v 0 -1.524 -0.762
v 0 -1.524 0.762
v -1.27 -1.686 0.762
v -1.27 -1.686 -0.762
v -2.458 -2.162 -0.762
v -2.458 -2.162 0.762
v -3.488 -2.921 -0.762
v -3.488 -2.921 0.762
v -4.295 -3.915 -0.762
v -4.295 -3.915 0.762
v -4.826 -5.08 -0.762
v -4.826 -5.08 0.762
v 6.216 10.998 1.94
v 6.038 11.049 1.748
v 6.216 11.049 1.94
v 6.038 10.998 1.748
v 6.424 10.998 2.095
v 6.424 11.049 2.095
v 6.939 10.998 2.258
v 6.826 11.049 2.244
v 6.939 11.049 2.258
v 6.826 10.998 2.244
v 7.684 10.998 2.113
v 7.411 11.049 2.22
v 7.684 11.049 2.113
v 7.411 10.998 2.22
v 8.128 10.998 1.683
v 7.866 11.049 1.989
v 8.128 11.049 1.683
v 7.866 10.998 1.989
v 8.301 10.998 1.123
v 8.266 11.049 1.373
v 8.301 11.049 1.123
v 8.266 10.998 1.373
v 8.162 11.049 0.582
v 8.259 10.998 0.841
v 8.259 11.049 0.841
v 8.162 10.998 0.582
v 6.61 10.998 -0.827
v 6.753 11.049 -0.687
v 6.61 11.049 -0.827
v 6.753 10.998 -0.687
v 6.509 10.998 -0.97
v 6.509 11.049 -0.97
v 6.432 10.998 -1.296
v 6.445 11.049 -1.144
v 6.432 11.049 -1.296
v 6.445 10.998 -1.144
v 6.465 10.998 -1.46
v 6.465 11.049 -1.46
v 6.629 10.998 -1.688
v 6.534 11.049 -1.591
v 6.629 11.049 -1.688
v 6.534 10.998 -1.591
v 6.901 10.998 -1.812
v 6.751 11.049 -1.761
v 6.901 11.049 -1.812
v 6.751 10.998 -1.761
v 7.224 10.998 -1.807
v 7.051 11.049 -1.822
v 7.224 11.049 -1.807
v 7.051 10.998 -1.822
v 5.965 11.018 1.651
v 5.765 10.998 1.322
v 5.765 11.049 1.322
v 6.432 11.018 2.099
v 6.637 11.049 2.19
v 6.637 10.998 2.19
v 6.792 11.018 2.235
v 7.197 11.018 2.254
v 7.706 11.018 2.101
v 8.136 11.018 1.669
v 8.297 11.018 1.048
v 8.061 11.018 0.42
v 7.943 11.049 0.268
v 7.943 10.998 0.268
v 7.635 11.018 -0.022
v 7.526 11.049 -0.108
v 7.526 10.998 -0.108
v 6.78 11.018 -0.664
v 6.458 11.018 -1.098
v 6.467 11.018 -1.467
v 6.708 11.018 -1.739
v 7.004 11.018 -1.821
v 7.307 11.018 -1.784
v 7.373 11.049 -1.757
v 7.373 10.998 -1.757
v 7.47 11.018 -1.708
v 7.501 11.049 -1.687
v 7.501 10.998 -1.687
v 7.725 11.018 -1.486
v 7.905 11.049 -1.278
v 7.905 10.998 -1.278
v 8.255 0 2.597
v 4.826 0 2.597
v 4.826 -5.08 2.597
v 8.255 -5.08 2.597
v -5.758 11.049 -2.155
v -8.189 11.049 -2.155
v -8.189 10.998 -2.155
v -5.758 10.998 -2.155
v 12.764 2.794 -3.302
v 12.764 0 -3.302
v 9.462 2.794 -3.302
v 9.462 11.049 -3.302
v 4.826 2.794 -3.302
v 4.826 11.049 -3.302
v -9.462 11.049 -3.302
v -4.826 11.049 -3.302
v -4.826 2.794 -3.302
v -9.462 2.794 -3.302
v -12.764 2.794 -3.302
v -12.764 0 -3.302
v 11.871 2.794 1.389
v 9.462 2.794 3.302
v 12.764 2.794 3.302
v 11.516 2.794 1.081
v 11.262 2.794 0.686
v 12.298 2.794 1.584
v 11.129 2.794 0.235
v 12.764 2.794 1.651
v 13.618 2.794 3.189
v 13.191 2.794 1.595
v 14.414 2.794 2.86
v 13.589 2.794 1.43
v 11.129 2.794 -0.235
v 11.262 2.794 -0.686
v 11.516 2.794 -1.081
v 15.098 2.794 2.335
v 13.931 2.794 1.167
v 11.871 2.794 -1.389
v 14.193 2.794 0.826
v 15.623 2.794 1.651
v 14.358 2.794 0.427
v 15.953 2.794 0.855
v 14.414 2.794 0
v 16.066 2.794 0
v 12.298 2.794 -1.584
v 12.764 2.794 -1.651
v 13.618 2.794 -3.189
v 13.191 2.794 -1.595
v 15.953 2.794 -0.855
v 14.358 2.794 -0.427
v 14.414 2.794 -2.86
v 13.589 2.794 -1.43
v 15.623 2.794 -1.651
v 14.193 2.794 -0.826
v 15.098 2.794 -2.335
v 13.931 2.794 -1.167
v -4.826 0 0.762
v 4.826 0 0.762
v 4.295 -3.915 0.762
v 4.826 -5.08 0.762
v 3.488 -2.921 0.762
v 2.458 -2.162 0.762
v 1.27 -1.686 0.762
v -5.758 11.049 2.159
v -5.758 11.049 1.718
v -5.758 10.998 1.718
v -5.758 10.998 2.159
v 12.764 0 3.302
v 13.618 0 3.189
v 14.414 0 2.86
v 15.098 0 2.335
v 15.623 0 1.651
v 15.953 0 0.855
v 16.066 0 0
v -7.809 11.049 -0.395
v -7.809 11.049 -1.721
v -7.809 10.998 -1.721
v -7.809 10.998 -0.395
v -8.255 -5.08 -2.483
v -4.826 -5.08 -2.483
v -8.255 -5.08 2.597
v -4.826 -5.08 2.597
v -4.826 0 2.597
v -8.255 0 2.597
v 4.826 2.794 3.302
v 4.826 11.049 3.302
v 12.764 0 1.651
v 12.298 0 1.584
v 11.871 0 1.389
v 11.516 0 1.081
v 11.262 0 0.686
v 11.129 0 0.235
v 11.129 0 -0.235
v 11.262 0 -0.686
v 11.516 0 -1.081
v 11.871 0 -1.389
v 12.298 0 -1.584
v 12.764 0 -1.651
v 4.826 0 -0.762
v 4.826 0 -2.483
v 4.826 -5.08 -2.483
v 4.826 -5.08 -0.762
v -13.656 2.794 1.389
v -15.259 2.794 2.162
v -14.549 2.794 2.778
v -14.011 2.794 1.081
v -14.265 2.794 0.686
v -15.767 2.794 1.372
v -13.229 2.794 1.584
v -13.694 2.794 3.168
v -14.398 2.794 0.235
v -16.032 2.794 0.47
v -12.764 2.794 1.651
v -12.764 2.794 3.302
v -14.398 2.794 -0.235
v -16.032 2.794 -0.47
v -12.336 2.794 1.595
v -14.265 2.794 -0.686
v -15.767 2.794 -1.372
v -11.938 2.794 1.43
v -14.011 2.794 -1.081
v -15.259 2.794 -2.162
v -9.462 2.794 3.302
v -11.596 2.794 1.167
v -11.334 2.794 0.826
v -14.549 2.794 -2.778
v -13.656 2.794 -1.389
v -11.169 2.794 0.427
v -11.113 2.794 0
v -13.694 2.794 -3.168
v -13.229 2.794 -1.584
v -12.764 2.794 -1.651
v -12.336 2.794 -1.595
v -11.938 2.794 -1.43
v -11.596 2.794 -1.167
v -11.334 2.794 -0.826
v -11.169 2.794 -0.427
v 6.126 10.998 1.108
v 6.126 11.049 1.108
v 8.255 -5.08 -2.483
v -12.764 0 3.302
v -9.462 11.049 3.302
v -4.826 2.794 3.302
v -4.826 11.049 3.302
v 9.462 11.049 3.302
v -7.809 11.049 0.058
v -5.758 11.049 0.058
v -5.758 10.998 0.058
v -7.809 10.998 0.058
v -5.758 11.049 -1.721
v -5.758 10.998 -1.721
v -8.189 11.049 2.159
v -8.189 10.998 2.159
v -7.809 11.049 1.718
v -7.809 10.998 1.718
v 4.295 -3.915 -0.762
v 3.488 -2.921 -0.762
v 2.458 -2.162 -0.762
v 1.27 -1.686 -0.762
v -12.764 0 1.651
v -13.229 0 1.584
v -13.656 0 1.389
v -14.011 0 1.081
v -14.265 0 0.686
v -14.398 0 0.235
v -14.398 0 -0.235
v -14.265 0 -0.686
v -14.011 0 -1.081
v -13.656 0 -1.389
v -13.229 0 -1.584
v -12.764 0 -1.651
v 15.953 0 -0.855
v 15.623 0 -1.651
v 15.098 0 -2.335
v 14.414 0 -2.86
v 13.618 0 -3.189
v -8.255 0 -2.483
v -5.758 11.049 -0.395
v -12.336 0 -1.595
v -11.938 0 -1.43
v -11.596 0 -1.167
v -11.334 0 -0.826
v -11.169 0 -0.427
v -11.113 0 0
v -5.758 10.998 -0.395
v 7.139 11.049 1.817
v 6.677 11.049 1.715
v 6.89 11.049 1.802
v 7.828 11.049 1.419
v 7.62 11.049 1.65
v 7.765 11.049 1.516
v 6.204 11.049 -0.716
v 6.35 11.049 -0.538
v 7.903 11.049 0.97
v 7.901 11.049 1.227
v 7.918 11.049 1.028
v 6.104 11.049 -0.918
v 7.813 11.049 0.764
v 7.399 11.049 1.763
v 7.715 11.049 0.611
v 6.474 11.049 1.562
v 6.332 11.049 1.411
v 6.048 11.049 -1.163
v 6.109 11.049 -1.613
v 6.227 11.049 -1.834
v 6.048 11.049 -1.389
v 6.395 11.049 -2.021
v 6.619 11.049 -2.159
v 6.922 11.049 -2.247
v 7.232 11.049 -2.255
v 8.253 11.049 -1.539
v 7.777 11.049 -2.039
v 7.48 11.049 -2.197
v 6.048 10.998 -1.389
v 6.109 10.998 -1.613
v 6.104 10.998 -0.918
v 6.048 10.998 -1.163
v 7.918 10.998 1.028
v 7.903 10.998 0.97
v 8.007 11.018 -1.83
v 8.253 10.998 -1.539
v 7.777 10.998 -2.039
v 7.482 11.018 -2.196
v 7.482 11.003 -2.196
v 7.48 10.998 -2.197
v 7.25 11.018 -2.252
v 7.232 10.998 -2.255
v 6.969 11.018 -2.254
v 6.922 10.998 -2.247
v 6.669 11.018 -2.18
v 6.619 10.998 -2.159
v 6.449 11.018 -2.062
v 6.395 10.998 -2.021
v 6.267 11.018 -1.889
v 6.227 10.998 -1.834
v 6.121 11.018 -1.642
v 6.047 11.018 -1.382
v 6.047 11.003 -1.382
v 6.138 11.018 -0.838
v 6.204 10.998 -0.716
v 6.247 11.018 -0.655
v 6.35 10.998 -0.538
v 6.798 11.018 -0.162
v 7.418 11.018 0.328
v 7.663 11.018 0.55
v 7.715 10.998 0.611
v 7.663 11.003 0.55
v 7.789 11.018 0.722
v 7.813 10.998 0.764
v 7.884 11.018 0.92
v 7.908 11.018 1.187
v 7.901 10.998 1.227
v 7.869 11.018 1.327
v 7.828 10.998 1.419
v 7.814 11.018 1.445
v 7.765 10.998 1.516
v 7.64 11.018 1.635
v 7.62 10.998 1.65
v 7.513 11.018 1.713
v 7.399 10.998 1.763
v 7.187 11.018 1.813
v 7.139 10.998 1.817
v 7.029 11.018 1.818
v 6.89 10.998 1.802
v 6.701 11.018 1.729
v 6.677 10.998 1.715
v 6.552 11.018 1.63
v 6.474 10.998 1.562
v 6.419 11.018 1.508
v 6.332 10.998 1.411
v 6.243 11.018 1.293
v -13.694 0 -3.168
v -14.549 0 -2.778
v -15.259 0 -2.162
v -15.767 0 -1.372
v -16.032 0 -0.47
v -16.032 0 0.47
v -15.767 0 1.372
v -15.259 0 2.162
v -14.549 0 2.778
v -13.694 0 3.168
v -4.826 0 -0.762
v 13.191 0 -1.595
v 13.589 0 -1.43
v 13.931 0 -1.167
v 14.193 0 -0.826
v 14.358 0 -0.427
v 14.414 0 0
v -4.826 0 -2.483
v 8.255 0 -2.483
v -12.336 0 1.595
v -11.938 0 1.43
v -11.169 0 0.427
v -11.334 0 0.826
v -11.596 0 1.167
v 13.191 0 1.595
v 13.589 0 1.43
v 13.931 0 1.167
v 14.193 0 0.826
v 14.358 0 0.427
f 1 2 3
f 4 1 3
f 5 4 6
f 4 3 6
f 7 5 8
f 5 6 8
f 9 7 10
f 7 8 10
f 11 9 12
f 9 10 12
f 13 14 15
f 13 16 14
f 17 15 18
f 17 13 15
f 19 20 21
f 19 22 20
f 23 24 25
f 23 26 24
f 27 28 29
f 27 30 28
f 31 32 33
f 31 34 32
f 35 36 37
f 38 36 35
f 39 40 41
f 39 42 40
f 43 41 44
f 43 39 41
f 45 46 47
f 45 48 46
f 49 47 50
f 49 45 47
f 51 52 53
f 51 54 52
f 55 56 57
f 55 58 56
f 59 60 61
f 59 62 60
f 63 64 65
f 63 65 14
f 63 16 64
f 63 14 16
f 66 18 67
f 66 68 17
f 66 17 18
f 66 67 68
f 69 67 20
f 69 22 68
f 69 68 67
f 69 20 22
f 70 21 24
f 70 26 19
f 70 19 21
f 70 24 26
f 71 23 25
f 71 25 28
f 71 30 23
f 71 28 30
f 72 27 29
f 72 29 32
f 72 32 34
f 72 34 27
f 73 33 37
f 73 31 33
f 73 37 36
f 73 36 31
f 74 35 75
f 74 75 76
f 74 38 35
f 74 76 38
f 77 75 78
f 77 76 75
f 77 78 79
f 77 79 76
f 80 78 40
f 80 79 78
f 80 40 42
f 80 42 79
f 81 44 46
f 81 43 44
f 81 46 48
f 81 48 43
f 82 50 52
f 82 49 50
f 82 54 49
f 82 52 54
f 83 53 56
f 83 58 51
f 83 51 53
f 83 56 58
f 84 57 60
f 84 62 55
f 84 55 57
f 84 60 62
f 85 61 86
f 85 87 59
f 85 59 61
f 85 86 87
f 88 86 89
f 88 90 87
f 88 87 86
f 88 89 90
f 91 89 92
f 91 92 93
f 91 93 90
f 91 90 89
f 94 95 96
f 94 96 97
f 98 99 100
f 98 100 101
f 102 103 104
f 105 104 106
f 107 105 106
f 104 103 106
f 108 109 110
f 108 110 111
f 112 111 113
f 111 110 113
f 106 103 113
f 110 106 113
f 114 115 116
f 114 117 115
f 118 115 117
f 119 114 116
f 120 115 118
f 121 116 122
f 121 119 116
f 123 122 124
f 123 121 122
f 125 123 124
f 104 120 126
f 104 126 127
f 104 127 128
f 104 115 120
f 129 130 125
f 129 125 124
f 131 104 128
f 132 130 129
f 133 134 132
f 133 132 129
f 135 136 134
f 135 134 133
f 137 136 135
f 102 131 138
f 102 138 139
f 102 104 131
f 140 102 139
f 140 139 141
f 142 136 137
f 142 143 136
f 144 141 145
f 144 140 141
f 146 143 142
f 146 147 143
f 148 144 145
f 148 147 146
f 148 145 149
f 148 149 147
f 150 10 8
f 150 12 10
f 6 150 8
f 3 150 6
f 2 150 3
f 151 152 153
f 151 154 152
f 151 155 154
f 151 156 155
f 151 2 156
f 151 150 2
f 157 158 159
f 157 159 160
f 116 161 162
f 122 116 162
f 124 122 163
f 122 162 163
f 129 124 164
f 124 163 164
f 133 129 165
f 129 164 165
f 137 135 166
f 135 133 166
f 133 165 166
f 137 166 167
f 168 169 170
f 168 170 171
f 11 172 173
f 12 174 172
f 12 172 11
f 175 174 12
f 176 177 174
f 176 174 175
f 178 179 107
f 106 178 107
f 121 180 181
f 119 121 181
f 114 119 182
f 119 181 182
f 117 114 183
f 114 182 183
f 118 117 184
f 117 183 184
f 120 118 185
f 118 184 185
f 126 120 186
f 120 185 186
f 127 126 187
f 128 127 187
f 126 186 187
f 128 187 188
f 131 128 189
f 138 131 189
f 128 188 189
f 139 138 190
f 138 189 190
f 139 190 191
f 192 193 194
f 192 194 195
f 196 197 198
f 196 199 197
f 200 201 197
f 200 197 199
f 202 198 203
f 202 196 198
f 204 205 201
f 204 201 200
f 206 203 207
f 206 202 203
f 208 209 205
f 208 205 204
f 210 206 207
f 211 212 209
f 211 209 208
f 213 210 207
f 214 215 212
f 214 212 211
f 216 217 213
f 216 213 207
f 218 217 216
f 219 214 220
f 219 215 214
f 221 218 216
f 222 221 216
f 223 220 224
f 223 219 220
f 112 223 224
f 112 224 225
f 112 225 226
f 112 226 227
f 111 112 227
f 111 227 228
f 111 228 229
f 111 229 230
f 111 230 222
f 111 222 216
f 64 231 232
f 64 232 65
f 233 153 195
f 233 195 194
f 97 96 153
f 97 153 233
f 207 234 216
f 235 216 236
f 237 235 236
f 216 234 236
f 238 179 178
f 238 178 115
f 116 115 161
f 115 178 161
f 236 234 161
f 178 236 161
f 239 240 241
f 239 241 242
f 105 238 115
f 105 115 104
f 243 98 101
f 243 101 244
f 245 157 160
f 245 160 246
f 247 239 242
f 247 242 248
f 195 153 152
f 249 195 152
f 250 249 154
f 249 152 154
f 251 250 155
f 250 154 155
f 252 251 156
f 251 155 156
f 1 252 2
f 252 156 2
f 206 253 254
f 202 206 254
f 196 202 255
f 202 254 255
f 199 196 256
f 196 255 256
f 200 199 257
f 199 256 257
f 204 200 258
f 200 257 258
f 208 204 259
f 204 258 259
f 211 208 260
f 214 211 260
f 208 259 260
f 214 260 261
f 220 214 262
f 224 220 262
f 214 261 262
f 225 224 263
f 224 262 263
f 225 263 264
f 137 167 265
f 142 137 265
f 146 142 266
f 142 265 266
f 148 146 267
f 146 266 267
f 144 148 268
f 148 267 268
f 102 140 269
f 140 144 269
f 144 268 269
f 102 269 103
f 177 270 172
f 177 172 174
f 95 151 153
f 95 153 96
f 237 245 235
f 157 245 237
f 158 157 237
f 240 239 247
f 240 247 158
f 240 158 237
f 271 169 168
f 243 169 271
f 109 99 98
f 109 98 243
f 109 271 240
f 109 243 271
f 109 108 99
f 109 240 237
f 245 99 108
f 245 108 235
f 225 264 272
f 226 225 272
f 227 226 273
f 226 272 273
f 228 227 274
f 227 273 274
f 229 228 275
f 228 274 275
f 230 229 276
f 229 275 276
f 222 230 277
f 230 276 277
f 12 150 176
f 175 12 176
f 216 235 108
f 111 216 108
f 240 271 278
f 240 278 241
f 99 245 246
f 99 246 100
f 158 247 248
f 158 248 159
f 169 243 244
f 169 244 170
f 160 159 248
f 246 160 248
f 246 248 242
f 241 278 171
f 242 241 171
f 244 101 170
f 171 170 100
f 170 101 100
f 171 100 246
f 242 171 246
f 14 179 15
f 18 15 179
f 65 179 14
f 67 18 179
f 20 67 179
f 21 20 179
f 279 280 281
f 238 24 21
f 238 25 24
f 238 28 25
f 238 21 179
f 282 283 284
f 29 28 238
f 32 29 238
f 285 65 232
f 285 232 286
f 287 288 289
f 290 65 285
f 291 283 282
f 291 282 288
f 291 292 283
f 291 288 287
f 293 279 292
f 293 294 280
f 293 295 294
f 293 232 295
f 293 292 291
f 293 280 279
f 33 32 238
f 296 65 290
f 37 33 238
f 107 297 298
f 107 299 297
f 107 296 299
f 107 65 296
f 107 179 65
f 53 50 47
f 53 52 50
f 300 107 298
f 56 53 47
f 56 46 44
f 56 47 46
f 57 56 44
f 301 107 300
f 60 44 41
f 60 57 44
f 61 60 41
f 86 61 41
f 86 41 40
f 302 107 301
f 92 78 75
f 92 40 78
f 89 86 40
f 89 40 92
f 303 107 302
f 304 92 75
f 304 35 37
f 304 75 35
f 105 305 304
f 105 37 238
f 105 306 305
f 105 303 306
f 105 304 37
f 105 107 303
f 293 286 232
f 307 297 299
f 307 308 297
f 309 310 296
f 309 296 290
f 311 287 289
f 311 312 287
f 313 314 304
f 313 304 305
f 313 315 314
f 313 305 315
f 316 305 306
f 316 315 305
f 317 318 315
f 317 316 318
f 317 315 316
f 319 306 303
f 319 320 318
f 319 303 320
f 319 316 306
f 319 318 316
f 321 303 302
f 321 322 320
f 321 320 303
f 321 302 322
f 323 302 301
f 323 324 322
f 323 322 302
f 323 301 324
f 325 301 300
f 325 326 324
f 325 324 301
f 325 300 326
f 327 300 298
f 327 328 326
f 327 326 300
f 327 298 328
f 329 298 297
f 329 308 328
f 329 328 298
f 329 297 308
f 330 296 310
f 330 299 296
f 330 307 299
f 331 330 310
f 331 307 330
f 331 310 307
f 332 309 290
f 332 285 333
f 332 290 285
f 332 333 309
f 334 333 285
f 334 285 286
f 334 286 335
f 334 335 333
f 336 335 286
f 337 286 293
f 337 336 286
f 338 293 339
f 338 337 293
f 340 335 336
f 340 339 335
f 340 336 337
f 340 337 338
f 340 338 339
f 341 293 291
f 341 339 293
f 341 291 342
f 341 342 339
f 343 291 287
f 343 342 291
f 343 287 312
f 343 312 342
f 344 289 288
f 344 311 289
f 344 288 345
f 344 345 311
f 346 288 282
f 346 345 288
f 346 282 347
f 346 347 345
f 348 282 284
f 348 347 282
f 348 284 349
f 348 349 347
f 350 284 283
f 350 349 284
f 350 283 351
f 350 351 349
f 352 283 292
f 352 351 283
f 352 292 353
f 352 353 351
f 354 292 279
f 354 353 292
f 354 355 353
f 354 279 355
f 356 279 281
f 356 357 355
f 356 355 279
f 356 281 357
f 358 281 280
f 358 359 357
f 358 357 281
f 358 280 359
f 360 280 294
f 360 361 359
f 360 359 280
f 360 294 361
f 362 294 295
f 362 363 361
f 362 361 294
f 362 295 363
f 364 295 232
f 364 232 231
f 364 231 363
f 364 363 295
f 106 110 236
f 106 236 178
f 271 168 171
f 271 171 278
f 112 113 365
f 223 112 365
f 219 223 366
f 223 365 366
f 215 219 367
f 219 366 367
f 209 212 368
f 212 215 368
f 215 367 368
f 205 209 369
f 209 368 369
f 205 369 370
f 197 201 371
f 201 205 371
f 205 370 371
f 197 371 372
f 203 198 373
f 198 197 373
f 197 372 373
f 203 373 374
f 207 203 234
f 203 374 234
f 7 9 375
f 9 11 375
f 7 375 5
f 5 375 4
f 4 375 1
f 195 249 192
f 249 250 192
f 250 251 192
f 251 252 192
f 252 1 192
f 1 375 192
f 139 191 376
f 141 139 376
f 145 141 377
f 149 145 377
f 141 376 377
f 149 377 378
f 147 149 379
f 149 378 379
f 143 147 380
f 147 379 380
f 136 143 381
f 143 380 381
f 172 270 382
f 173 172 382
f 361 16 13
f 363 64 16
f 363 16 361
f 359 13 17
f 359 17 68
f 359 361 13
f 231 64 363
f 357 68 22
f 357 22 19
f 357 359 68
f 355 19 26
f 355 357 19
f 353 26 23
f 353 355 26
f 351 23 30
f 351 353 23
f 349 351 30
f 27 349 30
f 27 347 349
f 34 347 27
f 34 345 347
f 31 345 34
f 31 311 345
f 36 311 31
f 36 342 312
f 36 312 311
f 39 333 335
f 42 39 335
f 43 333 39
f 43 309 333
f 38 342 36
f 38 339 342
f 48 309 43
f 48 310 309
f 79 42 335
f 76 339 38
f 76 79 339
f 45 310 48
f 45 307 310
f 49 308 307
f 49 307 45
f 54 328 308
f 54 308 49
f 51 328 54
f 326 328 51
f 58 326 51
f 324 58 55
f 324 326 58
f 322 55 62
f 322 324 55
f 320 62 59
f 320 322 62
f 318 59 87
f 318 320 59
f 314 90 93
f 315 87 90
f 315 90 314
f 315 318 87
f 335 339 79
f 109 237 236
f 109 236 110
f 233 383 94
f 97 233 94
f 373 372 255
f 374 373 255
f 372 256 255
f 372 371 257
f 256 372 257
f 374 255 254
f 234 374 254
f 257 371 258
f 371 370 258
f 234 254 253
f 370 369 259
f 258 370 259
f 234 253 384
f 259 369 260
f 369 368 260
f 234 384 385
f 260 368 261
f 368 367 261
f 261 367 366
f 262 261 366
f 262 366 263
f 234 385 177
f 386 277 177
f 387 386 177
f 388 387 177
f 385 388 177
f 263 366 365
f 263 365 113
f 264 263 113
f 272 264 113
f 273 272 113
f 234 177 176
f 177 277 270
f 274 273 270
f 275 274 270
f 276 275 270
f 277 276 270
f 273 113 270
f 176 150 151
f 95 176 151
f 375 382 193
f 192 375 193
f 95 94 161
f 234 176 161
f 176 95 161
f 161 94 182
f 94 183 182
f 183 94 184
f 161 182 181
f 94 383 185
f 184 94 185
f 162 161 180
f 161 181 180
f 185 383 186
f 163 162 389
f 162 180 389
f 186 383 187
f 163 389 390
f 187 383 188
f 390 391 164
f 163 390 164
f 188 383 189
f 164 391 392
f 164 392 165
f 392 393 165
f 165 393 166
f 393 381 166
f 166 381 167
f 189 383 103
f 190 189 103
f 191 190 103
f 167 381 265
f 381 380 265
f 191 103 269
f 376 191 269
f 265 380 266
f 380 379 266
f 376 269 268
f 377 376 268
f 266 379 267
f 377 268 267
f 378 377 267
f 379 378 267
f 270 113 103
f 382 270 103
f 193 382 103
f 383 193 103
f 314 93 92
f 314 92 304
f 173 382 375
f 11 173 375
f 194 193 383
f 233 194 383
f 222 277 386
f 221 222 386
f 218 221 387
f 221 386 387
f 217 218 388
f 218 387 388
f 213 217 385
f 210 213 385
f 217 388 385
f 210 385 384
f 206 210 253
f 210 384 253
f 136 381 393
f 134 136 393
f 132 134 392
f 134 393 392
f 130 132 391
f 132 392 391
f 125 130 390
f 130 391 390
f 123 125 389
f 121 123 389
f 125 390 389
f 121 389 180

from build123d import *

# Parameters (mm, degrees)
BOSS_EXTRUDE3_DEPTH = 11.049
SKETCH2_W           = 9.652
SKETCH2_H           = 6.604
SKETCH2_W_2         = 6.604
CUT_EXTRUDE1_DEPTH  = 8.255
SKETCH5_W           = 3.429
SKETCH5_H           = 5.08
BOSS_EXTRUDE4_DEPTH = 5.08
SKETCH6_W           = 9.652
SKETCH6_H           = 1.524
BOSS_EXTRUDE5_DEPTH = 5.08
CUT_EXTRUDE3_DEPTH  = 5.08
CUT_EXTRUDE4_START  = -0.0508
CUT_EXTRUDE4_DEPTH  = 0.0508
CUT_EXTRUDE5_DEPTH  = 0.0508


# Read off the part's stored shape, not the designer's step: Cut-Extrude4
with BuildPart() as part:
    # Sketch1 → Boss-Extrude3 (new body)
    with BuildSketch(Plane(origin=(0, 0, 0), x_dir=(1, 0, 0), z_dir=(0, 1, 0))):
        with BuildLine():
            ThreePointArc((-12.7635, 3.302), (-16.0655, 0), (-12.7635, -3.302))
            Line((-12.7635, -3.302), (-12.7635, -1.651))
            ThreePointArc((-12.7635, -1.651), (-14.4145, 0), (-12.7635, 1.651))
            Line((-12.7635, 1.651), (-12.7635, 3.302))
        make_face()
        with BuildLine():
            Line((-12.7635, -1.651), (-12.7635, -3.302))
            ThreePointArc((-12.7635, -3.302), (-10.428633409, -2.334866591), (-9.4615, 0))
            ThreePointArc((-9.4615, 0), (-10.428633409, 2.334866591), (-12.7635, 3.302))
            Line((-12.7635, 3.302), (-12.7635, 1.651))
            ThreePointArc((-12.7635, 1.651), (-11.596066704, 1.167433296), (-11.1125, 0))
            ThreePointArc((-11.1125, 0), (-11.596066704, -1.167433296), (-12.7635, -1.651))
        make_face()
        with BuildLine():
            Line((-12.7635, -3.302), (12.7635, -3.302))
            ThreePointArc((12.7635, -3.302), (9.4615, 0), (12.7635, 3.302))
            Line((12.7635, 3.302), (-12.7635, 3.302))
            ThreePointArc((-12.7635, 3.302), (-10.428633409, 2.334866591), (-9.4615, 0))
            ThreePointArc((-9.4615, 0), (-10.428633409, -2.334866591), (-12.7635, -3.302))
        make_face()
        with BuildLine():
            ThreePointArc((12.7635, 3.302), (9.4615, 0), (12.7635, -3.302))
            Line((12.7635, -3.302), (12.7635, -1.651))
            ThreePointArc((12.7635, -1.651), (11.1125, 0), (12.7635, 1.651))
            Line((12.7635, 1.651), (12.7635, 3.302))
        make_face()
        with BuildLine():
            Line((12.7635, -1.651), (12.7635, -3.302))
            ThreePointArc((12.7635, -3.302), (15.098366591, -2.334866591), (16.0655, 0))
            ThreePointArc((16.0655, 0), (15.098366591, 2.334866591), (12.7635, 3.302))
            Line((12.7635, 3.302), (12.7635, 1.651))
            ThreePointArc((12.7635, 1.651), (13.930933296, 1.167433296), (14.4145, 0))
            ThreePointArc((14.4145, 0), (13.930933296, -1.167433296), (12.7635, -1.651))
        make_face()
    extrude(amount=BOSS_EXTRUDE3_DEPTH)

    # Sketch2 → Cut-Extrude1 (cut)
    with BuildSketch(Plane(origin=(0, 11.049, 0), x_dir=(1, 0, 0), z_dir=(0, 1, 0))):
        Rectangle(SKETCH2_W, SKETCH2_H)
        with Locations((12.7635, 0)):
            Rectangle(SKETCH2_W_2, SKETCH2_H)
        with Locations((-12.7635, 0)):
            Rectangle(SKETCH2_W_2, SKETCH2_H)
    extrude(amount=-CUT_EXTRUDE1_DEPTH, mode=Mode.SUBTRACT)

    # Sketch5 → Boss-Extrude4 (add)
    with BuildSketch(Plane.XZ):
        with Locations((6.5405, 0.056957201)):
            Rectangle(SKETCH5_W, SKETCH5_H)
        with Locations((-6.5405, 0.056957201)):
            Rectangle(SKETCH5_W, SKETCH5_H)
    extrude(amount=BOSS_EXTRUDE4_DEPTH)

    # Sketch6 → Boss-Extrude5 (add)
    with BuildSketch(Plane.XZ):
        Rectangle(SKETCH6_W, SKETCH6_H)
    extrude(amount=BOSS_EXTRUDE5_DEPTH)

    # Sketch7 → Cut-Extrude3 (cut)
    with BuildSketch(Plane.XY.offset(0.762)):
        with BuildLine():
            ThreePointArc((-4.826, -5.08), (-0.756934481, -11.57255329), (5.052785714, -6.576785714))
            ThreePointArc((5.052785714, -6.576785714), (4.995767575, -5.819851233), (4.826, -5.08))
            Line((4.826, -5.08), (-4.826, -5.08))
        make_face()
        with BuildLine():
            Line((-4.826, -5.08), (4.826, -5.08))
            ThreePointArc((4.826, -5.08), (2.997307625, -2.50901108), (0, -1.524))
            ThreePointArc((0, -1.524), (-2.997307625, -2.50901108), (-4.826, -5.08))
        make_face()
    extrude(amount=-CUT_EXTRUDE3_DEPTH, mode=Mode.SUBTRACT)

    # Cut-Extrude4 outline → Cut-Extrude4 (cut)
    with BuildSketch(Plane(origin=(0, 11.049, 0), x_dir=(1, 0, 0), z_dir=(0, 1, 0)).offset(CUT_EXTRUDE4_START)):
        with BuildLine():
            Line((6.125651291, -1.107505234), (5.764715133, -1.322388012))
            add(Edge.make_bspline(
                [(5.764715133, -1.322388012), (5.795848726, -1.396544386), (5.855526361, -1.499286266), (5.978159662, -1.669974458), (6.05114933, -1.775594986), (6.148137968, -1.884253365), (6.256046735, -1.979672728), (6.372017343, -2.072531851), (6.478000588, -2.125037114), (6.583983834, -2.177542378), (6.687715089, -2.205891048), (6.772837481, -2.228601824), (6.855428053, -2.259126551), (6.956720766, -2.259126551), (7.082059087, -2.259126551), (7.202566961, -2.259126551), (7.355228923, -2.239958049), (7.545854824, -2.189191034), (7.64564176, -2.137070791), (7.756302185, -2.074391176), (7.861852333, -1.998233742), (7.956762183, -1.91923746), (8.138419792, -1.696975289), (8.222600111, -1.522442374), (8.284179667, -1.341062147), (8.308803358, -1.188392086), (8.308803358, -1.045195403), (8.257662319, -0.813306269), (8.216986985, -0.673773492), (8.132229192, -0.510521819), (7.993166094, -0.321750968), (7.909998502, -0.224416829), (7.802295587, -0.121226034), (7.6621337, 0.004412918), (7.5566666, 0.088832099), (7.079288797, 0.442114266), (6.827397054, 0.625925615), (6.758715893, 0.678132356), (6.698618911, 0.734864272), (6.648436244, 0.783693405), (6.615575385, 0.819143072), (6.575738864, 0.868399704), (6.535888686, 0.916871649), (6.495665853, 0.988895848), (6.455893708, 1.086814708), (6.435475968, 1.172671893), (6.422326559, 1.281945673), (6.441309585, 1.39829107), (6.467008859, 1.482949614), (6.517139065, 1.57939298), (6.576546974, 1.648262165), (6.660252521, 1.721257683), (6.76204807, 1.770361107), (6.850036001, 1.799422275), (6.919376094, 1.821827394), (7.000254698, 1.821827394), (7.060862271, 1.821827394), (7.158295762, 1.821827394), (7.245490979, 1.805342484), (7.330857485, 1.780448172), (7.394182968, 1.74575823), (7.422569964, 1.733524046), (7.454232705, 1.716179075), (7.490911825, 1.697072046), (7.514106284, 1.676478569), (7.564005826, 1.643675962), (7.656944095, 1.554409737), (7.739669602, 1.474435351), (7.776778642, 1.43169931), (7.842489762, 1.361666912), (7.905039475, 1.278267425)],
                knots=[0, 0, 0, 0, 0, 0, 0, 0, 0.015625, 0.03125, 0.046875, 0.0625, 0.078125, 0.09375, 0.109375, 0.125, 0.140625, 0.15625, 0.171875, 0.1875, 0.203125, 0.21875, 0.234375, 0.25, 0.265625, 0.28125, 0.296875, 0.3125, 0.328125, 0.34375, 0.359375, 0.375, 0.390625, 0.40625, 0.421875, 0.4375, 0.453125, 0.46875, 0.484375, 0.5, 0.515625, 0.53125, 0.546875, 0.5625, 0.578125, 0.59375, 0.609375, 0.625, 0.640625, 0.65625, 0.671875, 0.6875, 0.703125, 0.71875, 0.734375, 0.75, 0.765625, 0.78125, 0.796875, 0.8125, 0.828125, 0.84375, 0.859375, 0.875, 0.890625, 0.90625, 0.921875, 0.9375, 0.953125, 0.96875, 0.984375, 1, 1, 1, 1, 1, 1, 1, 1], degree=7))
            Line((7.905039475, 1.278267425), (8.253289165, 1.539455103))
            add(Edge.make_bspline(
                [(8.253289165, 1.539455103), (8.156895883, 1.66119447), (8.080596703, 1.752467641), (8.009921379, 1.822625174), (7.933726759, 1.919905891), (7.824588167, 2.017677373), (7.667478791, 2.113158926), (7.554717937, 2.174929753), (7.426668873, 2.21890102), (7.295363504, 2.247898039), (7.181818455, 2.267110724), (7.014103692, 2.267110724), (6.815864787, 2.237013824), (6.659136337, 2.182262131), (6.55037867, 2.129800369), (6.423181047, 2.050572345), (6.335021768, 1.976771869), (6.231051482, 1.855134106), (6.149145224, 1.716981286), (6.084448013, 1.567732126), (6.040533381, 1.421764923), (6.040533381, 1.293676397), (6.040533381, 1.143393573), (6.070495088, 0.985652762), (6.137396877, 0.821399612), (6.210558512, 0.692920171), (6.259072046, 0.646259485), (6.293158014, 0.580378426), (6.471822739, 0.420467618), (6.75149803, 0.193678775), (6.790287956, 0.170783169), (7.498283405, -0.384707414), (7.577864327, -0.459159137), (7.65987138, -0.544113603), (7.728973771, -0.621025877), (7.79510367, -0.718827072), (7.865584999, -0.866409444), (7.892864321, -0.947931981), (7.924722723, -1.016219237), (7.924722723, -1.066155835), (7.908904135, -1.168139886), (7.908904135, -1.225535848), (7.873403325, -1.31658975), (7.846091508, -1.386832441), (7.81374531, -1.446533535), (7.789405983, -1.495887306), (7.72836903, -1.555160993), (7.677947198, -1.604126212), (7.627570897, -1.65047546), (7.548458311, -1.699013274), (7.474880936, -1.729316994), (7.409037252, -1.764969223), (7.304160871, -1.794806682), (7.188897018, -1.818103802), (7.115683884, -1.818103802), (7.027185487, -1.818103802), (6.93589672, -1.818103802), (6.863229947, -1.796088084), (6.759400758, -1.765758188), (6.658680651, -1.706691455), (6.586423649, -1.661131989), (6.506706136, -1.594528182), (6.442547065, -1.533389449), (6.378433525, -1.469634745), (6.304296754, -1.382180872), (6.232995884, -1.281685995), (6.192311068, -1.220896958), (6.149245652, -1.146989207), (6.125651291, -1.107505234)],
                knots=[0, 0, 0, 0, 0, 0, 0, 0, 0.016129032, 0.032258065, 0.048387097, 0.064516129, 0.080645161, 0.096774194, 0.112903226, 0.129032258, 0.14516129, 0.161290323, 0.177419355, 0.193548387, 0.209677419, 0.225806452, 0.241935484, 0.258064516, 0.274193548, 0.290322581, 0.306451613, 0.322580645, 0.338709677, 0.35483871, 0.370967742, 0.387096774, 0.403225806, 0.419354839, 0.435483871, 0.451612903, 0.467741935, 0.483870968, 0.5, 0.516129032, 0.532258065, 0.548387097, 0.564516129, 0.580645161, 0.596774194, 0.612903226, 0.629032258, 0.64516129, 0.661290323, 0.677419355, 0.693548387, 0.709677419, 0.725806452, 0.741935484, 0.758064516, 0.774193548, 0.790322581, 0.806451613, 0.822580645, 0.838709677, 0.85483871, 0.870967742, 0.887096774, 0.903225806, 0.919354839, 0.935483871, 0.951612903, 0.967741935, 0.983870968, 1, 1, 1, 1, 1, 1, 1, 1], degree=7))
        make_face()
    extrude(amount=CUT_EXTRUDE4_DEPTH, mode=Mode.SUBTRACT)

    # Sketch10 → Cut-Extrude5 (cut)
    with BuildSketch(Plane(origin=(0, 11.049, 0), x_dir=(1, 0, 0), z_dir=(0, 1, 0))):
        Polygon((-5.758009801, 2.155020867), (-5.758009801, 1.720550301), (-7.809265142, 1.720550301), (-7.809265142, 0.395375626), (-5.758009801, 0.395375626), (-5.758009801, -0.057812947), (-7.809265142, -0.057812947), (-7.809265142, -1.718355868), (-5.758009801, -1.718355868), (-5.758009801, -2.159), (-8.188893002, -2.159), (-8.188893002, 2.155020867), align=None)
    extrude(amount=-CUT_EXTRUDE5_DEPTH, mode=Mode.SUBTRACT)


solid = part.part
